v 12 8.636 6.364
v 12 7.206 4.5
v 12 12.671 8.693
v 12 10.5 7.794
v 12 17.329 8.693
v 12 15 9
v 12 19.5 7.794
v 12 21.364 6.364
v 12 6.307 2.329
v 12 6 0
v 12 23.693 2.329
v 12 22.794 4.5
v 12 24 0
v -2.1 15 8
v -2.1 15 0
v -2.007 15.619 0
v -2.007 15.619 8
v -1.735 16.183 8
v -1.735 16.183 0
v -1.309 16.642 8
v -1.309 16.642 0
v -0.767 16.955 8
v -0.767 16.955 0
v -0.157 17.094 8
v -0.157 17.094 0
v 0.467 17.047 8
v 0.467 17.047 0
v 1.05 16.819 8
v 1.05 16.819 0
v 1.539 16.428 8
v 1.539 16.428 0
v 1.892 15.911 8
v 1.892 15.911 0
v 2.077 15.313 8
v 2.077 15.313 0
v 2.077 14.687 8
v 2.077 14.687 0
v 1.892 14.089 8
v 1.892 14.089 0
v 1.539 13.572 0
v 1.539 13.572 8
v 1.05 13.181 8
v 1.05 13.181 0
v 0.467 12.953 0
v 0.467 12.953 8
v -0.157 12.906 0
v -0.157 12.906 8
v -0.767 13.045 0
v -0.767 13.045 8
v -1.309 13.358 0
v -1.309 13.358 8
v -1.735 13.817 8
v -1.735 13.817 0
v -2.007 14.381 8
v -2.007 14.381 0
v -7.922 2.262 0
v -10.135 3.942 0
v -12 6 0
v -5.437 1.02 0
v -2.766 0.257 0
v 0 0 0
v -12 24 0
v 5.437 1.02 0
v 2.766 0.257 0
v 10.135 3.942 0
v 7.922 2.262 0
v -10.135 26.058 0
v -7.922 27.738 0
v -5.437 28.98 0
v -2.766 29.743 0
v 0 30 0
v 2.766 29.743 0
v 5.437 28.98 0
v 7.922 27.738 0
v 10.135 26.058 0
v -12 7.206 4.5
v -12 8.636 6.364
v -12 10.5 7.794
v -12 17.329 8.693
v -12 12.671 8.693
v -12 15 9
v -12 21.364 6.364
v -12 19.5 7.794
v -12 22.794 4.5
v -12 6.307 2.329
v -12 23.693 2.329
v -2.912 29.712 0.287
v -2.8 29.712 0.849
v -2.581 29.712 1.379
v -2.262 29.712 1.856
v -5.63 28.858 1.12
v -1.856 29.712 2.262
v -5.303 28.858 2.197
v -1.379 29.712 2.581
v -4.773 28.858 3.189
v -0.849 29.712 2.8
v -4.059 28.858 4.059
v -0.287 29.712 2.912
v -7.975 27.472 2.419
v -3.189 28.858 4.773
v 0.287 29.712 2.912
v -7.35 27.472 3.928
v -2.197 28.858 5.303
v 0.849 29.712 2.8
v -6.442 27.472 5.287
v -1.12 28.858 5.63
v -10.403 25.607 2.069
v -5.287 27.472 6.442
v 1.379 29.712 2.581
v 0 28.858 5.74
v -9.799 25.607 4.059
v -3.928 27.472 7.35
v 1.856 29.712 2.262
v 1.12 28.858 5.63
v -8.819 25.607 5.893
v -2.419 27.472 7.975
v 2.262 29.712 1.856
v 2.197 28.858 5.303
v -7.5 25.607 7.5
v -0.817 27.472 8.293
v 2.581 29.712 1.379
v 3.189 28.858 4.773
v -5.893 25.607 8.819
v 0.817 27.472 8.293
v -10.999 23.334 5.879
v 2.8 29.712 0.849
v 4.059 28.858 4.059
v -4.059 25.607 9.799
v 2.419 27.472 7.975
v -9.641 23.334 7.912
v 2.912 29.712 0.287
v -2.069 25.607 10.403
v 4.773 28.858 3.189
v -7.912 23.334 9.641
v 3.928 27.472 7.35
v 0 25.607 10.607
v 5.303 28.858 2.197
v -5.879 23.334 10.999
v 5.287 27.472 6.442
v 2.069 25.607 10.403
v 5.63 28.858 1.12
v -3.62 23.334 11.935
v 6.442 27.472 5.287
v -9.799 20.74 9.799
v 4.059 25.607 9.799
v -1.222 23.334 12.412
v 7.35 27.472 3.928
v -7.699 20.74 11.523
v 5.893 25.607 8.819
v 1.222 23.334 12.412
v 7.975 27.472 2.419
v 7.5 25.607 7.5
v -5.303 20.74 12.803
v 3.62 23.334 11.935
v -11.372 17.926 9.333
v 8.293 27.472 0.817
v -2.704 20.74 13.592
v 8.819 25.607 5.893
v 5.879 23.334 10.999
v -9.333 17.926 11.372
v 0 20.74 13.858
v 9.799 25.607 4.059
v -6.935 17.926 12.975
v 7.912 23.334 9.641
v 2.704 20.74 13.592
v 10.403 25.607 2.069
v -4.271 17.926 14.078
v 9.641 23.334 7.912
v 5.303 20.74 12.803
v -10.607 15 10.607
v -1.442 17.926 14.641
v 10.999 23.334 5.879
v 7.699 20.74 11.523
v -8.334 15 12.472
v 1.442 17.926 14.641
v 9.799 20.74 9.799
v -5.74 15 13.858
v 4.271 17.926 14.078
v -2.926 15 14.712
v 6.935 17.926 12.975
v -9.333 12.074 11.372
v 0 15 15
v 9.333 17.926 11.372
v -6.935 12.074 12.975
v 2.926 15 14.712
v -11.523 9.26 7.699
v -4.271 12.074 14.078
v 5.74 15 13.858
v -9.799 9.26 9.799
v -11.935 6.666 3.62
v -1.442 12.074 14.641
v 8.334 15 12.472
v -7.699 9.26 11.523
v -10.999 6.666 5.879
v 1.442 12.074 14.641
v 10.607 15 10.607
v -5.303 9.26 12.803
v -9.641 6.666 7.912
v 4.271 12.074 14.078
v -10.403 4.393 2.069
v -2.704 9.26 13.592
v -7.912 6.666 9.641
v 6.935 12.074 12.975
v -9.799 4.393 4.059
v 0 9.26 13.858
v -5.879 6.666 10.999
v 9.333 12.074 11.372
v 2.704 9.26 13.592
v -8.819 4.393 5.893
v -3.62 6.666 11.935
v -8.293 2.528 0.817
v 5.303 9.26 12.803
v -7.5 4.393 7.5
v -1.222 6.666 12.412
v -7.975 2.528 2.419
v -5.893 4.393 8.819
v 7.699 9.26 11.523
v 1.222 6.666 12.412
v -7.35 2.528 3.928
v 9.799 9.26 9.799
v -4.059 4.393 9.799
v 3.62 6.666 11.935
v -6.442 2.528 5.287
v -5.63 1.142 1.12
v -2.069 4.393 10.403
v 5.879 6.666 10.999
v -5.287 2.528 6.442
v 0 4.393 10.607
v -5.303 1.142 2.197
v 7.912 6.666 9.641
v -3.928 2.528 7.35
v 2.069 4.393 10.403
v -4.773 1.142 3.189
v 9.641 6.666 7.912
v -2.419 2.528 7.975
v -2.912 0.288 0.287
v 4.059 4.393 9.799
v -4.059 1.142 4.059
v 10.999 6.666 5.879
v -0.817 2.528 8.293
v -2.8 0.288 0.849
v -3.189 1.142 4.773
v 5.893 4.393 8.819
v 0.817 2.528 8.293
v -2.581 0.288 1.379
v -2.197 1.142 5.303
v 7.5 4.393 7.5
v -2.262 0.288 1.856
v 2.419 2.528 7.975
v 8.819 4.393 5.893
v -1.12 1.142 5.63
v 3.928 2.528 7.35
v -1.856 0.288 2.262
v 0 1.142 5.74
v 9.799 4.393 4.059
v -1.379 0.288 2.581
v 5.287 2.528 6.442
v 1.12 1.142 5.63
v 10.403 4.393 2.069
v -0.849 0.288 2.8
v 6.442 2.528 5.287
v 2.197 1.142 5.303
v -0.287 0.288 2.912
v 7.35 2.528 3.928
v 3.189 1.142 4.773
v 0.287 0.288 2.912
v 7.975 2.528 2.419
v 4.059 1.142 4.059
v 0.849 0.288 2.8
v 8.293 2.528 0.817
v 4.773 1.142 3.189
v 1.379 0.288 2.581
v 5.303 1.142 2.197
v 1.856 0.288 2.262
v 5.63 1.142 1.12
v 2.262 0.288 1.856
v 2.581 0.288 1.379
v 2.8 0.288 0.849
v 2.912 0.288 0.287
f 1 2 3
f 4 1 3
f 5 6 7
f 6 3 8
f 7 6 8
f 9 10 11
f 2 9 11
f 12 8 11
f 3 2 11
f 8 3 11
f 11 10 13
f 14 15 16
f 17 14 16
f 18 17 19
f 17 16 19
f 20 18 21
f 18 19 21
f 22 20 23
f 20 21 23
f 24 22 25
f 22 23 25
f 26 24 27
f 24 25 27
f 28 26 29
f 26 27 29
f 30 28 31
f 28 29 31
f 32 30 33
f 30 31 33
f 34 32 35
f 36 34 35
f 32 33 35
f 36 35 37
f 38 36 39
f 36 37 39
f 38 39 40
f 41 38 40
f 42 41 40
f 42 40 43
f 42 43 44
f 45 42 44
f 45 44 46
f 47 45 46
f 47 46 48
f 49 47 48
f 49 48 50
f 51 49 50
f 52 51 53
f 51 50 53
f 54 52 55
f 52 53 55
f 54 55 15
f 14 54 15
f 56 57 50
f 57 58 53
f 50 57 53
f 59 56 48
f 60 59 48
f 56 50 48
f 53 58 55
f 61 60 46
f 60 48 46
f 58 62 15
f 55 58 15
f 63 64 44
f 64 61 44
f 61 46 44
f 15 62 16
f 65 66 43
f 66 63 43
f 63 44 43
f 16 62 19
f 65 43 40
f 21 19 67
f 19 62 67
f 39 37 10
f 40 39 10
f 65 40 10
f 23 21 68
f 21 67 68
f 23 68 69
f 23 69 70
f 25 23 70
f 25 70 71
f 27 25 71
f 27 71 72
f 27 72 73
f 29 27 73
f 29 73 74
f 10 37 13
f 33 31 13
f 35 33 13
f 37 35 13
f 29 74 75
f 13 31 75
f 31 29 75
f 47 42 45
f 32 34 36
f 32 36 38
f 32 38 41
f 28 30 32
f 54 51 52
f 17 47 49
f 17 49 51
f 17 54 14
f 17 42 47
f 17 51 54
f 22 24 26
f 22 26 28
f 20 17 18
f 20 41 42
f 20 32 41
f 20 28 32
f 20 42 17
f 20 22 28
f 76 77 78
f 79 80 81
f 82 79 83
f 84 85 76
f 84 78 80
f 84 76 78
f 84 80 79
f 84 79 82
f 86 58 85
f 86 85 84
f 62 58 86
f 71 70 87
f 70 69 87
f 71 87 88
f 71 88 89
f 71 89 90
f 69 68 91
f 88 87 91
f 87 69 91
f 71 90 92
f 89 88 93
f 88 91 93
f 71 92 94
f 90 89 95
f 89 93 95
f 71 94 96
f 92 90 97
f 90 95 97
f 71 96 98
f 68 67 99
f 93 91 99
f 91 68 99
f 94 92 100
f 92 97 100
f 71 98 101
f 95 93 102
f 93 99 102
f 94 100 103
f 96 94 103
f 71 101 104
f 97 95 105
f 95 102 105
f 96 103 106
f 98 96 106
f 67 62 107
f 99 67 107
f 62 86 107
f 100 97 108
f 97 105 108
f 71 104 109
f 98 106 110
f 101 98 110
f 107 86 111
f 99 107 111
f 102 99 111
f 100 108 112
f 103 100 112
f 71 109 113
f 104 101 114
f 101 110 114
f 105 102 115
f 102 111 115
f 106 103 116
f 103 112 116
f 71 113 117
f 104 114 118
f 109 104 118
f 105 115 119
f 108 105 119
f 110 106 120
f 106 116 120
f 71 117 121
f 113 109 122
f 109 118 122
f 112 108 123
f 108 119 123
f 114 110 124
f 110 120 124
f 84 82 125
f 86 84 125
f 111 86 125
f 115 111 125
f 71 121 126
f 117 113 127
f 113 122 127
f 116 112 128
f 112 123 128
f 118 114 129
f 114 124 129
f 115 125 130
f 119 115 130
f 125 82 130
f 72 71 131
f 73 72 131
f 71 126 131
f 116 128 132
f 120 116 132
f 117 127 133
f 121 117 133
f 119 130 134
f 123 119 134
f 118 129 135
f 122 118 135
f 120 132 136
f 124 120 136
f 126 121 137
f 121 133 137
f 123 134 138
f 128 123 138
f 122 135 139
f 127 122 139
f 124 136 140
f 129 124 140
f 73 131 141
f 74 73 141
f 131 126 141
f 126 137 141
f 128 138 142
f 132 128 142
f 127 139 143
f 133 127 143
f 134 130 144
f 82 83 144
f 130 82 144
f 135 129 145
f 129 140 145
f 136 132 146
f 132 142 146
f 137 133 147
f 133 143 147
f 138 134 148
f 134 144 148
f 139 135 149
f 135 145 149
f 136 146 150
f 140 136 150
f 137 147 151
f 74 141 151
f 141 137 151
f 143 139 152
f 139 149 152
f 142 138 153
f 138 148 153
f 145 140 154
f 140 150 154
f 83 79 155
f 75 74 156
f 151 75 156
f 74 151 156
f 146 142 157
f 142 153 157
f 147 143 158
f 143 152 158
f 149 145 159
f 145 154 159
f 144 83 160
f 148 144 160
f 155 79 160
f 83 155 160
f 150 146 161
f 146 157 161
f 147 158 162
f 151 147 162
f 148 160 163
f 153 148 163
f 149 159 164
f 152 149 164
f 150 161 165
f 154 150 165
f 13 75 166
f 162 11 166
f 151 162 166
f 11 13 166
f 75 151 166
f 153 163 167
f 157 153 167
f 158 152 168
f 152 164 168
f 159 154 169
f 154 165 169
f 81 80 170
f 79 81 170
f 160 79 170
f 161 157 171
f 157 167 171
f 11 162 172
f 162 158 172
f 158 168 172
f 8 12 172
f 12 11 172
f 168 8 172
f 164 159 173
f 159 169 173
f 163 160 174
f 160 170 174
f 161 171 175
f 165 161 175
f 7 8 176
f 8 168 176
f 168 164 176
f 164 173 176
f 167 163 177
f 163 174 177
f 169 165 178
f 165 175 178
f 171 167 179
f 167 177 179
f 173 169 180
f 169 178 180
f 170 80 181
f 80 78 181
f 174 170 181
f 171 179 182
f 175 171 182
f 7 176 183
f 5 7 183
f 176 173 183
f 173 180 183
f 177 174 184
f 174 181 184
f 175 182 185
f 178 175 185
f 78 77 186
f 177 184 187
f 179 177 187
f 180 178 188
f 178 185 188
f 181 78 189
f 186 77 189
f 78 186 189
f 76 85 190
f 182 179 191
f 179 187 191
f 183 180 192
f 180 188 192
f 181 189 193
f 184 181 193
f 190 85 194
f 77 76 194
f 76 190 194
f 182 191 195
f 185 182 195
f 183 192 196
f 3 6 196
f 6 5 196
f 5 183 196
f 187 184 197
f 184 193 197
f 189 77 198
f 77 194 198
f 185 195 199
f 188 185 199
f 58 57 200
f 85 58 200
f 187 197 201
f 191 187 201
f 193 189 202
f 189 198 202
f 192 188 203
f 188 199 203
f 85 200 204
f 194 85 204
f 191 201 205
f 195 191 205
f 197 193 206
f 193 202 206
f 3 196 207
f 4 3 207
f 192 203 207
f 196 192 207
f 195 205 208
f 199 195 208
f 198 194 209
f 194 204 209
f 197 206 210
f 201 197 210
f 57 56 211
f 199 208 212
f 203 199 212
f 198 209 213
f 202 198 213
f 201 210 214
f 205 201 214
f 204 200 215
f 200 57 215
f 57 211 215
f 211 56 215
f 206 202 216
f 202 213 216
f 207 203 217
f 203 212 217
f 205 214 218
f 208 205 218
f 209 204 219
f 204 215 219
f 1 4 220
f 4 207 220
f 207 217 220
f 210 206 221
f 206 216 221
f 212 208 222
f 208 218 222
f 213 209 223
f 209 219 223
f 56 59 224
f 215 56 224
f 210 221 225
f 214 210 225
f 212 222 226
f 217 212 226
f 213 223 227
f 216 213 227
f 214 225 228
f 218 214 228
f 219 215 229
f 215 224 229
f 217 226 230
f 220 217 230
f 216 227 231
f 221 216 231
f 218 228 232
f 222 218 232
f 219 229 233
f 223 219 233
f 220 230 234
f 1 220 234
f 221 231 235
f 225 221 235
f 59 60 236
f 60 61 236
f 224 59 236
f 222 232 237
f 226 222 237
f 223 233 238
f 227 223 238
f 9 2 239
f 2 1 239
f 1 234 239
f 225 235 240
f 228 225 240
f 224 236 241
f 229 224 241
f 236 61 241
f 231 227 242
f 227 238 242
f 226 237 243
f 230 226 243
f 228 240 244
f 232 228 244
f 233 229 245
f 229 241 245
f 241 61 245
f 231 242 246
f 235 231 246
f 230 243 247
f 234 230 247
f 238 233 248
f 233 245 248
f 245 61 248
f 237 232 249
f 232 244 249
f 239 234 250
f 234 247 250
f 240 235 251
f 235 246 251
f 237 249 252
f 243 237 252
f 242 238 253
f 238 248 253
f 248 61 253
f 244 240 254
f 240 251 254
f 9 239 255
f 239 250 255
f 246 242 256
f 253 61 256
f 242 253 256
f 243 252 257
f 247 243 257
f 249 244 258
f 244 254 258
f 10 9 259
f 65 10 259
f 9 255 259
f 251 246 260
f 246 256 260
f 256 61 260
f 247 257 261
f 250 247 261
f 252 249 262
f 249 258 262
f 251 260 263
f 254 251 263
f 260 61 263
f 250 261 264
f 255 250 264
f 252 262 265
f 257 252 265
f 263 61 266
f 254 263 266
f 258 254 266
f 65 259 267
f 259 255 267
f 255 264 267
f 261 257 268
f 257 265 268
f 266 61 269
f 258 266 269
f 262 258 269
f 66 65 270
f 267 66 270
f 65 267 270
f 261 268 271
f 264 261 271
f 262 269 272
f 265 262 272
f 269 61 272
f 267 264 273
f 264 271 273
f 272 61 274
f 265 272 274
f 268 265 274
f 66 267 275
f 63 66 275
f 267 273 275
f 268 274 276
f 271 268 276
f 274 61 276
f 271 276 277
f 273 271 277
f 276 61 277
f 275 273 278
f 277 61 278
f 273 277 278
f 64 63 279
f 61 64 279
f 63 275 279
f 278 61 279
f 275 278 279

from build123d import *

# Parameters (mm, degrees)
REVOLVE1_ANGLE     = 180
SKETCH3_W          = 56.622410577
SKETCH3_H          = 52.672009839
SKETCH3_W_2        = 24
SKETCH3_H_2        = 38.977287281
CUT_EXTRUDE1_DEPTH = 10
SKETCH4_R          = 2.1
CUT_EXTRUDE2_DEPTH = 8


with BuildPart() as part:
    # Sketch2 → Revolve1 (revolve)
    with BuildSketch(Plane.XY):
        with BuildLine():
            Line((0, 0), (0, 30))
            ThreePointArc((0, 30), (-15, 15), (0, 0))
        make_face()
    revolve(axis=Axis((0, 0, 0), (0, 1, 0)), revolution_arc=REVOLVE1_ANGLE)

    # Sketch3 → Cut-Extrude1 (cut)
    with BuildSketch(Plane(origin=(0, 0, 0), x_dir=(-1, 0, 0), z_dir=(0, 0, -1))):
        with Locations((-0.219466708, 13.463733046)):
            Rectangle(SKETCH3_W, SKETCH3_H)
        with Locations((0, 15.219466708)):
            Rectangle(SKETCH3_W_2, SKETCH3_H_2, mode=Mode.SUBTRACT)
    extrude(amount=-CUT_EXTRUDE1_DEPTH, mode=Mode.SUBTRACT)

    # Sketch4 → Cut-Extrude2 (cut)
    with BuildSketch(Plane(origin=(0, 0, 0), x_dir=(-1, 0, 0), z_dir=(0, 0, -1))):
        with Locations((0, 15)):
            Circle(SKETCH4_R)
    extrude(amount=-CUT_EXTRUDE2_DEPTH, mode=Mode.SUBTRACT)


solid = part.part
